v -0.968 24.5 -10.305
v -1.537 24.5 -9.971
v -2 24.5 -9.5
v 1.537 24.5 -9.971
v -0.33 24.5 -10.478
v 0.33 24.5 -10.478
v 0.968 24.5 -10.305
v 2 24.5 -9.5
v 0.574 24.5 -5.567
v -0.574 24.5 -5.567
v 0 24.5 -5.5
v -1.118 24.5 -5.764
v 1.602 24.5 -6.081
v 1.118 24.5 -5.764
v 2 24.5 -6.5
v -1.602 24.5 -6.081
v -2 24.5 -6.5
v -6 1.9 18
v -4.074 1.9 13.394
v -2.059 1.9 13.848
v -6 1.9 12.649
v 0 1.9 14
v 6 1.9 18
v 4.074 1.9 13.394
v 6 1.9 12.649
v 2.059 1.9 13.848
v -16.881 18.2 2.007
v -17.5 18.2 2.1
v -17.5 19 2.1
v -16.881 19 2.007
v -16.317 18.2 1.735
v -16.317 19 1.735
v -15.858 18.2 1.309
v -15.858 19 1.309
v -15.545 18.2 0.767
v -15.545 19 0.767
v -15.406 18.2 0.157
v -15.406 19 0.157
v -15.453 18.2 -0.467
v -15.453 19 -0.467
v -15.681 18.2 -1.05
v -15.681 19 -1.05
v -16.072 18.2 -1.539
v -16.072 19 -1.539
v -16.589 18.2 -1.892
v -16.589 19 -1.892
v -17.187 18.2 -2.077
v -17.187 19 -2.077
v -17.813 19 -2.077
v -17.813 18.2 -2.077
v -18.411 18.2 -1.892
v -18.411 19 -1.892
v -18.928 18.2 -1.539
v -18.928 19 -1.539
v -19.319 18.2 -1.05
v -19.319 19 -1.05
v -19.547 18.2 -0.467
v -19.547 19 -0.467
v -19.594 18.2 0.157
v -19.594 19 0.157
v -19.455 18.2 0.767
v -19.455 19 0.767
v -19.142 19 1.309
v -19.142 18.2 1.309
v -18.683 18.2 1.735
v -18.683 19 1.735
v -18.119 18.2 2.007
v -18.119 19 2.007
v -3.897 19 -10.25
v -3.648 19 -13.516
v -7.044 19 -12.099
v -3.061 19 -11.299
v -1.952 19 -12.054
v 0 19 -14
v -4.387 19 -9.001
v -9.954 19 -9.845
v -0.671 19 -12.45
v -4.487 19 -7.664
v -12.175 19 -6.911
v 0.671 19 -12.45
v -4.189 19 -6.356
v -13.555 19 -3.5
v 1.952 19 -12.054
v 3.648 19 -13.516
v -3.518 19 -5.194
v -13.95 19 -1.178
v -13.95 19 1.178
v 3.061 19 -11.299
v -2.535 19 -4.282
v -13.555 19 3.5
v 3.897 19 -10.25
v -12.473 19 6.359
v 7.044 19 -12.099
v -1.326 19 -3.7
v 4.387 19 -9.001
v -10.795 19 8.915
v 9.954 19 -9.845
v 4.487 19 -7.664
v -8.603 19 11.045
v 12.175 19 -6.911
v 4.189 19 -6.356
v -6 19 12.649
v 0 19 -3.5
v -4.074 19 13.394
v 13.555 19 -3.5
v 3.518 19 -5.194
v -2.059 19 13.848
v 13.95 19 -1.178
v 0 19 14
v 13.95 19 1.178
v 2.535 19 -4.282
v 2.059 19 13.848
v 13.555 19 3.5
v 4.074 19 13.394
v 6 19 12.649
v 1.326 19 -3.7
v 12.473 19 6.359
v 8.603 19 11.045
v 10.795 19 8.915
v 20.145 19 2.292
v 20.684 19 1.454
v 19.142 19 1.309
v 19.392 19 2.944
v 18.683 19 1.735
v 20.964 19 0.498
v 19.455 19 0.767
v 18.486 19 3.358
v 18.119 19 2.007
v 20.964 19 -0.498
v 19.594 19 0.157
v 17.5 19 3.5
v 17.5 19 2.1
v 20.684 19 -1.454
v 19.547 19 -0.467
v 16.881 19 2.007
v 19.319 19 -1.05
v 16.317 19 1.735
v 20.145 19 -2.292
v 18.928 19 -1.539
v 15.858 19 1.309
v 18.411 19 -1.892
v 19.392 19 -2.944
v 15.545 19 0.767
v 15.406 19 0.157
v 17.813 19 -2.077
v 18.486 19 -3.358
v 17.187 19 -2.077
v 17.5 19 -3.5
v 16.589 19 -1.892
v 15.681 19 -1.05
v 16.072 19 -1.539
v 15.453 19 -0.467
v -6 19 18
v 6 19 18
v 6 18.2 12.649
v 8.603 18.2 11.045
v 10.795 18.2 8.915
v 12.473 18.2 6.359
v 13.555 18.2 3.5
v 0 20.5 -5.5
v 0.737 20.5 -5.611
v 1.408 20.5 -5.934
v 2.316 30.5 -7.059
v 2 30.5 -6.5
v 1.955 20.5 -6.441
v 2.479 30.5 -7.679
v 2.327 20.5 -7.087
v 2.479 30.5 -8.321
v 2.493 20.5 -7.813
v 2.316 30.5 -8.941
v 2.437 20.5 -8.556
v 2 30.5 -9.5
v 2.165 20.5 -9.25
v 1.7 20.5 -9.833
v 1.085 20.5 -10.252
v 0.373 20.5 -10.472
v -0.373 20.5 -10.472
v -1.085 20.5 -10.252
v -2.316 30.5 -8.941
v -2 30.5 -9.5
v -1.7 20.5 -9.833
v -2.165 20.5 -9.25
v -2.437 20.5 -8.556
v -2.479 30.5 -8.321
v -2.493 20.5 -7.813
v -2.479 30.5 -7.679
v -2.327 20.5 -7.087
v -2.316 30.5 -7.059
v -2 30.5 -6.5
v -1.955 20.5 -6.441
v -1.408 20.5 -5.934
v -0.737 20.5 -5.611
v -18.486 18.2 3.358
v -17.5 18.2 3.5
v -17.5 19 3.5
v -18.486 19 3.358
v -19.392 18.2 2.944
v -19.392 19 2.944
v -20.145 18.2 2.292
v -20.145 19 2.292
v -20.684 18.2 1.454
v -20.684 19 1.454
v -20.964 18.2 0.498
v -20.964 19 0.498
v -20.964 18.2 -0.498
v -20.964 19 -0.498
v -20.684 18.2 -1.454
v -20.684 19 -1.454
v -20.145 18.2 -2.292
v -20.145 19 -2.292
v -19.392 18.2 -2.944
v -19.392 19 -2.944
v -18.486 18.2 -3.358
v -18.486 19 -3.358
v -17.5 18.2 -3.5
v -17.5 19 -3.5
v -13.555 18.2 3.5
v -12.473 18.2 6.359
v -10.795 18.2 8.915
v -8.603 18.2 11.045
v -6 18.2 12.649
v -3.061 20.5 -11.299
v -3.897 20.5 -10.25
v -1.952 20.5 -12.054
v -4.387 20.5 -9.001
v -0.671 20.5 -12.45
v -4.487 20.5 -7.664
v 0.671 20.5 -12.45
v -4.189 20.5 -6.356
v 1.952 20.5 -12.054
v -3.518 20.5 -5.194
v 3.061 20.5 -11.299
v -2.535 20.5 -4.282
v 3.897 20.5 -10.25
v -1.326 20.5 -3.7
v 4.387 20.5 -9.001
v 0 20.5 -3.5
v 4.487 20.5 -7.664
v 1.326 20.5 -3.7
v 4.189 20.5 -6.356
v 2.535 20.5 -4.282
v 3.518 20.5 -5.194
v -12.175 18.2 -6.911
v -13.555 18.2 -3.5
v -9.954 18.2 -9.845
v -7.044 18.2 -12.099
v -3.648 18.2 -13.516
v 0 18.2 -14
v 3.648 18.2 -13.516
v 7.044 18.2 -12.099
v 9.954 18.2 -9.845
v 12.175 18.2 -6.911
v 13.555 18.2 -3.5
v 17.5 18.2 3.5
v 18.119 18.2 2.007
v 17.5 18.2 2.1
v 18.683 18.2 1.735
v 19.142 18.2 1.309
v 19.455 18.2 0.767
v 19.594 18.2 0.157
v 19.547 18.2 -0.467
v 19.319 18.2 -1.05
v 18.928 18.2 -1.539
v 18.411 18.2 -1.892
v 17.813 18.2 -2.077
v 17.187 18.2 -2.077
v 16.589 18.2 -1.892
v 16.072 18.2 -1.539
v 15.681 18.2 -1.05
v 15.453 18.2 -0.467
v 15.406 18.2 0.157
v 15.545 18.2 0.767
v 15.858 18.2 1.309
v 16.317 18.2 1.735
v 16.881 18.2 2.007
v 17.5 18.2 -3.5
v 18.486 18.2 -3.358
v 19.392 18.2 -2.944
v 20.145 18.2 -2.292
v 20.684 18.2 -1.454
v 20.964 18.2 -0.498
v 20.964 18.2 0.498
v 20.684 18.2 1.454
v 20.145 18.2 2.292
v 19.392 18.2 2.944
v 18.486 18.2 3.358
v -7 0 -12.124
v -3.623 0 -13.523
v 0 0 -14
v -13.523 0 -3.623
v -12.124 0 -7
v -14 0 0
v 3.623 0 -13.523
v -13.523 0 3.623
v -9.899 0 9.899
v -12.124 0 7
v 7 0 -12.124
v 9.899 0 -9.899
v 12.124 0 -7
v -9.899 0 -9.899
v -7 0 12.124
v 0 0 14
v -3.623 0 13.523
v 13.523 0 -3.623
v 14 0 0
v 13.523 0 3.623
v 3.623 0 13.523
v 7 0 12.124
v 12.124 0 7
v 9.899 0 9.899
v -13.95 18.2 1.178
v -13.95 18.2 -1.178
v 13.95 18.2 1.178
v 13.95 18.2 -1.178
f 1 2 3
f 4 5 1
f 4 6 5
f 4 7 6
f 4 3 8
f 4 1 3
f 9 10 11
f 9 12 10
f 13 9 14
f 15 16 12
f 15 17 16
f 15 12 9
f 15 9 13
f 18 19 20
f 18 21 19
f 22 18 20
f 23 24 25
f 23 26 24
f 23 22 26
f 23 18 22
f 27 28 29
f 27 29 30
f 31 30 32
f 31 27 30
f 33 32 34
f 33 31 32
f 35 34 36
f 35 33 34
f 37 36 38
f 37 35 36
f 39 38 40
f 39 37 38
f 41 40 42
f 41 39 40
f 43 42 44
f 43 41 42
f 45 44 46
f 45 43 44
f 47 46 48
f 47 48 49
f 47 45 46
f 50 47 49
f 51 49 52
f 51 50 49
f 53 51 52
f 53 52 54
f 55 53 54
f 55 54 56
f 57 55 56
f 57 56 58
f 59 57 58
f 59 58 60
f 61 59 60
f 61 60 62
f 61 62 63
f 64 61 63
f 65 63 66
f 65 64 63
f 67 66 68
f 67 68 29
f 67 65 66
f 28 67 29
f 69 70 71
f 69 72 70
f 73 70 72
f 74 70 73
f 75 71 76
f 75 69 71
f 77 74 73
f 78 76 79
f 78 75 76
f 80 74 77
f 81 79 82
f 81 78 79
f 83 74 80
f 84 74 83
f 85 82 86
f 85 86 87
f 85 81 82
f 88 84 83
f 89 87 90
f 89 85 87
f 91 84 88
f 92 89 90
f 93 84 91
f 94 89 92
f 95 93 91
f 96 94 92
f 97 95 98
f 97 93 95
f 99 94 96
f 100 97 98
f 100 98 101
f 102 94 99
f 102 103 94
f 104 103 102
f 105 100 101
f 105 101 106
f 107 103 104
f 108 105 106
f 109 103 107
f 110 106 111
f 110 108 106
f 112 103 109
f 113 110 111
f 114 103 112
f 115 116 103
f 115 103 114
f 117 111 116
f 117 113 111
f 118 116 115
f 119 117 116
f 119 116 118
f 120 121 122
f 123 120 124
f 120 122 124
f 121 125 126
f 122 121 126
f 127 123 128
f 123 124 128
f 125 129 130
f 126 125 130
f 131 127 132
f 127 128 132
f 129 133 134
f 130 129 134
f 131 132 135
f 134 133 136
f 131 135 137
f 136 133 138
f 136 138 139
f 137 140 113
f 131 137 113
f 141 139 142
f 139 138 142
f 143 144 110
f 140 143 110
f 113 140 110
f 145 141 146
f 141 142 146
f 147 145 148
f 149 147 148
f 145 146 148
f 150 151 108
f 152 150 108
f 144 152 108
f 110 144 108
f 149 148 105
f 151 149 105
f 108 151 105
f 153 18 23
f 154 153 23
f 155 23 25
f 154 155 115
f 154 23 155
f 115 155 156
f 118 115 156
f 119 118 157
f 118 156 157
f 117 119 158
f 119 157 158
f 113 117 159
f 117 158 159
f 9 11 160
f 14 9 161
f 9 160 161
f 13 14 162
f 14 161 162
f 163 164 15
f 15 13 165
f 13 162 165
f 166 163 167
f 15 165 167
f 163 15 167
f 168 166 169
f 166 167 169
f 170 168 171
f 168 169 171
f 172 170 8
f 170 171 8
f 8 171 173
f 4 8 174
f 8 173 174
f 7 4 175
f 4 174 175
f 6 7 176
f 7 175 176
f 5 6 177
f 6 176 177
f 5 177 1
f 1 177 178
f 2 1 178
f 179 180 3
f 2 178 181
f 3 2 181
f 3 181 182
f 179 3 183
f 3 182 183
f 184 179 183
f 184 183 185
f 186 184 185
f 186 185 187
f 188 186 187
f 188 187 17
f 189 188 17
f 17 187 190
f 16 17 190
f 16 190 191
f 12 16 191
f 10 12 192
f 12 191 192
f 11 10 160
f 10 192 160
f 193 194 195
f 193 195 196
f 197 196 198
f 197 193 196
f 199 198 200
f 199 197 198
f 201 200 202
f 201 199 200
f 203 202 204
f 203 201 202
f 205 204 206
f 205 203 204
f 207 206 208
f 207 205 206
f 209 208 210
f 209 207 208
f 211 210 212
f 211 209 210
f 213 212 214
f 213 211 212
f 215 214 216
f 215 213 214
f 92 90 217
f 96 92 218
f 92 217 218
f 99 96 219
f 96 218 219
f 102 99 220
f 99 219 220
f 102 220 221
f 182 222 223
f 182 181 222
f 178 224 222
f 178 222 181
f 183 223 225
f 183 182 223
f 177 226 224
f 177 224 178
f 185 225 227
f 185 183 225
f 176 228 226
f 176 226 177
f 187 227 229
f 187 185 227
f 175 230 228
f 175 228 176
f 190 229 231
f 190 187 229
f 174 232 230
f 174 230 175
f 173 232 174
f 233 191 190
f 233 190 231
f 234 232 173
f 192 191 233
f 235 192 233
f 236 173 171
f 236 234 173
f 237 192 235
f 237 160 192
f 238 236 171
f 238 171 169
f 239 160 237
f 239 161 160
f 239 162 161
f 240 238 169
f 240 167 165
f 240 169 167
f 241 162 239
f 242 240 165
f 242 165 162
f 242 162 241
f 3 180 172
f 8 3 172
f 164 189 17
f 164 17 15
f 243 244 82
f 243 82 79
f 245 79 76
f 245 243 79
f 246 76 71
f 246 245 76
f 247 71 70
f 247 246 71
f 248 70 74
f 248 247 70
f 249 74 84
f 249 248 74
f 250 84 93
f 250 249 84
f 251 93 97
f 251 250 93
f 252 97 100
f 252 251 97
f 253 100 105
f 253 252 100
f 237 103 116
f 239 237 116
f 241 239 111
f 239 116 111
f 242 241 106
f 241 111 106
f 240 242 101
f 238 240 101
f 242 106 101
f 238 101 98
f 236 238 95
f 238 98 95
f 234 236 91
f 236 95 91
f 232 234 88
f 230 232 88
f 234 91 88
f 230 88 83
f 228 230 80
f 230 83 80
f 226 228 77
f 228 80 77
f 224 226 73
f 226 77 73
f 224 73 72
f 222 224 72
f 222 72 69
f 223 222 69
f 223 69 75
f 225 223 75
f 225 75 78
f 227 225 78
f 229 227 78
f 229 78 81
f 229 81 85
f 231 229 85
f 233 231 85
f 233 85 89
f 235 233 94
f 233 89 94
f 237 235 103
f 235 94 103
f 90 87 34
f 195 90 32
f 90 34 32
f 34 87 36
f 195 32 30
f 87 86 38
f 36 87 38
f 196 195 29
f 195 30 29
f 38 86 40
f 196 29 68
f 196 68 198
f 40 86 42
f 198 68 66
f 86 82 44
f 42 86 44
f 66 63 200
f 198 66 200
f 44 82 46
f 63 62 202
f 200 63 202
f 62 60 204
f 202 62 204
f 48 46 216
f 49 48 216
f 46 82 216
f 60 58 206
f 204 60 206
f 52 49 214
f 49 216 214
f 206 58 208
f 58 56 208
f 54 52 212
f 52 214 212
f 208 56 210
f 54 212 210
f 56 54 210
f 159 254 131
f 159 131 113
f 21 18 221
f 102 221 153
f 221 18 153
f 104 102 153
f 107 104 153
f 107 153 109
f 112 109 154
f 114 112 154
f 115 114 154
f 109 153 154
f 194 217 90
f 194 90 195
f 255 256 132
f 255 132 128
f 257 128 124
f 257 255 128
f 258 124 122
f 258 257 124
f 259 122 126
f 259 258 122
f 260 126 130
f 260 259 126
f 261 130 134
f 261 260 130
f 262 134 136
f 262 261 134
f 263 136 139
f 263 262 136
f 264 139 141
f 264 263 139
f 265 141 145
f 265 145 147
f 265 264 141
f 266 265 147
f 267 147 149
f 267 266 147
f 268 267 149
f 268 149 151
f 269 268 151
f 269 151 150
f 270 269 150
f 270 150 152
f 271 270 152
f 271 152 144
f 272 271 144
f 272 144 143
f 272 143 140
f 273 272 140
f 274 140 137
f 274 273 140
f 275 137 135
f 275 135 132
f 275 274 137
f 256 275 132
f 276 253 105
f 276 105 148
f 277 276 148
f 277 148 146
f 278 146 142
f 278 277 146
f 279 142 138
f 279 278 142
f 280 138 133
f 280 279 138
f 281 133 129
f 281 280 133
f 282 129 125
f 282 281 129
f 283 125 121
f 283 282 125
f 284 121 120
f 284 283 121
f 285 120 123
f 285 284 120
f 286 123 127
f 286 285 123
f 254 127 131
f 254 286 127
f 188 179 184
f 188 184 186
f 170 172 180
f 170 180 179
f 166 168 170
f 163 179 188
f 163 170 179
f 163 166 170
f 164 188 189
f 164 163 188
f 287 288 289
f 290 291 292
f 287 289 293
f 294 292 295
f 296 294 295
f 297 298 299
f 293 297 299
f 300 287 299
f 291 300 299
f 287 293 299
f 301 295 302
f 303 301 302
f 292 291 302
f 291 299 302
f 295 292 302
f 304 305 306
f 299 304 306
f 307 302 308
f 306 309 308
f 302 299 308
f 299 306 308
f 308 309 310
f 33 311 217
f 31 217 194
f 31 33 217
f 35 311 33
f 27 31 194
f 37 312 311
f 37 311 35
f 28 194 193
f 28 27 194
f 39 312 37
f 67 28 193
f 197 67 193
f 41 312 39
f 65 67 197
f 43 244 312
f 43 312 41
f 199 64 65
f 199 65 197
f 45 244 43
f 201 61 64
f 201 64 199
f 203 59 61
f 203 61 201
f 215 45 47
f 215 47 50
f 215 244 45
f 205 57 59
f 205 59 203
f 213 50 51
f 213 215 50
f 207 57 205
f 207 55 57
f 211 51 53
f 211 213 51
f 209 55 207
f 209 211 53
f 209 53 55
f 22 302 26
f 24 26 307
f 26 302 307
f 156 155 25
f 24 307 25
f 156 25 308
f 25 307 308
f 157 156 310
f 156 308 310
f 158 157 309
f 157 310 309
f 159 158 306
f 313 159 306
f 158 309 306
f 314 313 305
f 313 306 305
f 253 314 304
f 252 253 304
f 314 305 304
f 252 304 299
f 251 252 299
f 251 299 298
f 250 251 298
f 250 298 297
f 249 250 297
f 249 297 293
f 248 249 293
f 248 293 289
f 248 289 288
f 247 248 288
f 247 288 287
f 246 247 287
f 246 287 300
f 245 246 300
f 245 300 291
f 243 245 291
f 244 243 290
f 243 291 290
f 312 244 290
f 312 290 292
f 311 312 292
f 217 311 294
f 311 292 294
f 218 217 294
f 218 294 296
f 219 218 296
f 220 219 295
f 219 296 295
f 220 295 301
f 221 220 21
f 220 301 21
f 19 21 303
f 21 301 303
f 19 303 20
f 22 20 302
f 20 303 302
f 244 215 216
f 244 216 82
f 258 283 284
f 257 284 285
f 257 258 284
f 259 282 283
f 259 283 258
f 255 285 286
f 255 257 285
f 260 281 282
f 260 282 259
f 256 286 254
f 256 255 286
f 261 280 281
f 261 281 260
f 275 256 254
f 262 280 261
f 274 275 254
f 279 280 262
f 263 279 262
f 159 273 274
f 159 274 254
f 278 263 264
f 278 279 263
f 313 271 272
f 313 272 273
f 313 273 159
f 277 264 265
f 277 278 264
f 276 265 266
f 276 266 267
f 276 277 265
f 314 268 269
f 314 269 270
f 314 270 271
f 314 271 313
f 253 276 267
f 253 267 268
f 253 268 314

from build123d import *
from build123d.topology import SkipClean

# Parameters (mm, degrees)
CROQUIS1_R                   = 14
SALIENTE_EXTRUIR1_DEPTH      = 19
SALIENTE_EXTRUIR2_START      = -0.8
CROQUIS2_R                   = 2.1
SALIENTE_EXTRUIR2_DEPTH      = 0.8
SALIENTE_EXTRUIR3_REACH      = 51.591
SALIENTE_EXTRUIR3_END_RADIUS = 14
SALIENTE_EXTRUIR3_START      = 18
CROQUIS3_W                   = 12
CROQUIS3_H                   = 17.1
CROQUIS4_R                   = 4.5
SALIENTE_EXTRUIR4_DEPTH      = 1.5
CROQUIS5_R                   = 2.5
SALIENTE_EXTRUIR5_DEPTH      = 10
CROQUIS7_W                   = 6.557991655
CROQUIS7_H                   = 1.368399833
CROQUIS7_W_2                 = 6.403078466
CROQUIS7_H_2                 = 1.988052588
CORTAR_EXTRUIR1_DEPTH        = 6


with BuildPart() as part:
    # Croquis1 → Saliente-Extruir1 (new body)
    with BuildSketch(Plane(origin=(0, 0, 0), x_dir=(1, 0, 0), z_dir=(0, 1, 0))):
        Circle(CROQUIS1_R)
    extrude(amount=SALIENTE_EXTRUIR1_DEPTH)

    # Croquis2 → Saliente-Extruir2 (add)
    with SkipClean():  # the faces are left unmerged after this step: merging them gives an invalid solid
        with BuildSketch(Plane(origin=(0, 19, 0), x_dir=(1, 0, 0), z_dir=(0, 1, 0)).offset(SALIENTE_EXTRUIR2_START)):
            with BuildLine():
                Line((-17.5, 3.5), (-13.555441712, 3.5))
                ThreePointArc((-13.555441712, 3.5), (0, 14), (13.555441712, 3.5))
                Line((13.555441712, 3.5), (17.5, 3.5))
                ThreePointArc((17.5, 3.5), (21, 0), (17.5, -3.5))
                Line((17.5, -3.5), (13.555441712, -3.5))
                ThreePointArc((13.555441712, -3.5), (0, -14), (-13.555441712, -3.5))
                Line((-13.555441712, -3.5), (-17.5, -3.5))
                ThreePointArc((-17.5, -3.5), (-21, 0), (-17.5, 3.5))
            make_face()
            with Locations((-17.5, 0)):
                Circle(CROQUIS2_R, mode=Mode.SUBTRACT)
            with Locations((17.5, 0)):
                Circle(CROQUIS2_R, mode=Mode.SUBTRACT)
        extrude(amount=SALIENTE_EXTRUIR2_DEPTH)

    # Saliente-Extruir3: up to this cylinder (the profile starts outside it)
    with SkipClean():  # the faces are left unmerged after this step: merging them gives an invalid solid
        saliente_extruir3_end = Plane(origin=(0, 10.45, 0), z_dir=(0, -1, 0)) * Cylinder(SALIENTE_EXTRUIR3_END_RADIUS, 132.182, mode=Mode.PRIVATE)
        # Croquis3 → Saliente-Extruir3 (add, up to the surface)
        with BuildSketch(Plane.XY.offset(SALIENTE_EXTRUIR3_START), mode=Mode.PRIVATE) as saliente_extruir3_sk1:
            with Locations((0, 10.45)):
                Rectangle(CROQUIS3_W, CROQUIS3_H)
        saliente_extruir3_tool1 = extrude(saliente_extruir3_sk1.sketch, amount=-SALIENTE_EXTRUIR3_REACH, mode=Mode.PRIVATE) - saliente_extruir3_end
        add(saliente_extruir3_tool1.solids().sort_by_distance((0, 10.45, 18))[0])

    # Croquis4 → Saliente-Extruir4 (add)
    with SkipClean():  # the faces are left unmerged after this step: merging them gives an invalid solid
        with BuildSketch(Plane(origin=(0, 19, 0), x_dir=(1, 0, 0), z_dir=(0, 1, 0))):
            with Locations((0, 8)):
                Circle(CROQUIS4_R)
        extrude(amount=SALIENTE_EXTRUIR4_DEPTH)

    # Croquis5 → Saliente-Extruir5 (add)
    with SkipClean():  # the faces are left unmerged after this step: merging them gives an invalid solid
        with BuildSketch(Plane(origin=(0, 20.5, 0), x_dir=(1, 0, 0), z_dir=(0, 1, 0))):
            with Locations((0, 8)):
                Circle(CROQUIS5_R)
        extrude(amount=SALIENTE_EXTRUIR5_DEPTH)

    # Croquis7 → Cortar-Extruir1 (cut)
    with SkipClean():  # the faces are left unmerged after this step: merging them gives an invalid solid
        with BuildSketch(Plane(origin=(0, 30.5, 0), x_dir=(1, 0, 0), z_dir=(0, 1, 0))):
            with Locations((0.036072912, 10.184199917)):
                Rectangle(CROQUIS7_W, CROQUIS7_H)
            with Locations((-0.041383682, 5.505973706)):
                Rectangle(CROQUIS7_W_2, CROQUIS7_H_2)
        extrude(amount=-CORTAR_EXTRUIR1_DEPTH, mode=Mode.SUBTRACT)


solid = part.part
